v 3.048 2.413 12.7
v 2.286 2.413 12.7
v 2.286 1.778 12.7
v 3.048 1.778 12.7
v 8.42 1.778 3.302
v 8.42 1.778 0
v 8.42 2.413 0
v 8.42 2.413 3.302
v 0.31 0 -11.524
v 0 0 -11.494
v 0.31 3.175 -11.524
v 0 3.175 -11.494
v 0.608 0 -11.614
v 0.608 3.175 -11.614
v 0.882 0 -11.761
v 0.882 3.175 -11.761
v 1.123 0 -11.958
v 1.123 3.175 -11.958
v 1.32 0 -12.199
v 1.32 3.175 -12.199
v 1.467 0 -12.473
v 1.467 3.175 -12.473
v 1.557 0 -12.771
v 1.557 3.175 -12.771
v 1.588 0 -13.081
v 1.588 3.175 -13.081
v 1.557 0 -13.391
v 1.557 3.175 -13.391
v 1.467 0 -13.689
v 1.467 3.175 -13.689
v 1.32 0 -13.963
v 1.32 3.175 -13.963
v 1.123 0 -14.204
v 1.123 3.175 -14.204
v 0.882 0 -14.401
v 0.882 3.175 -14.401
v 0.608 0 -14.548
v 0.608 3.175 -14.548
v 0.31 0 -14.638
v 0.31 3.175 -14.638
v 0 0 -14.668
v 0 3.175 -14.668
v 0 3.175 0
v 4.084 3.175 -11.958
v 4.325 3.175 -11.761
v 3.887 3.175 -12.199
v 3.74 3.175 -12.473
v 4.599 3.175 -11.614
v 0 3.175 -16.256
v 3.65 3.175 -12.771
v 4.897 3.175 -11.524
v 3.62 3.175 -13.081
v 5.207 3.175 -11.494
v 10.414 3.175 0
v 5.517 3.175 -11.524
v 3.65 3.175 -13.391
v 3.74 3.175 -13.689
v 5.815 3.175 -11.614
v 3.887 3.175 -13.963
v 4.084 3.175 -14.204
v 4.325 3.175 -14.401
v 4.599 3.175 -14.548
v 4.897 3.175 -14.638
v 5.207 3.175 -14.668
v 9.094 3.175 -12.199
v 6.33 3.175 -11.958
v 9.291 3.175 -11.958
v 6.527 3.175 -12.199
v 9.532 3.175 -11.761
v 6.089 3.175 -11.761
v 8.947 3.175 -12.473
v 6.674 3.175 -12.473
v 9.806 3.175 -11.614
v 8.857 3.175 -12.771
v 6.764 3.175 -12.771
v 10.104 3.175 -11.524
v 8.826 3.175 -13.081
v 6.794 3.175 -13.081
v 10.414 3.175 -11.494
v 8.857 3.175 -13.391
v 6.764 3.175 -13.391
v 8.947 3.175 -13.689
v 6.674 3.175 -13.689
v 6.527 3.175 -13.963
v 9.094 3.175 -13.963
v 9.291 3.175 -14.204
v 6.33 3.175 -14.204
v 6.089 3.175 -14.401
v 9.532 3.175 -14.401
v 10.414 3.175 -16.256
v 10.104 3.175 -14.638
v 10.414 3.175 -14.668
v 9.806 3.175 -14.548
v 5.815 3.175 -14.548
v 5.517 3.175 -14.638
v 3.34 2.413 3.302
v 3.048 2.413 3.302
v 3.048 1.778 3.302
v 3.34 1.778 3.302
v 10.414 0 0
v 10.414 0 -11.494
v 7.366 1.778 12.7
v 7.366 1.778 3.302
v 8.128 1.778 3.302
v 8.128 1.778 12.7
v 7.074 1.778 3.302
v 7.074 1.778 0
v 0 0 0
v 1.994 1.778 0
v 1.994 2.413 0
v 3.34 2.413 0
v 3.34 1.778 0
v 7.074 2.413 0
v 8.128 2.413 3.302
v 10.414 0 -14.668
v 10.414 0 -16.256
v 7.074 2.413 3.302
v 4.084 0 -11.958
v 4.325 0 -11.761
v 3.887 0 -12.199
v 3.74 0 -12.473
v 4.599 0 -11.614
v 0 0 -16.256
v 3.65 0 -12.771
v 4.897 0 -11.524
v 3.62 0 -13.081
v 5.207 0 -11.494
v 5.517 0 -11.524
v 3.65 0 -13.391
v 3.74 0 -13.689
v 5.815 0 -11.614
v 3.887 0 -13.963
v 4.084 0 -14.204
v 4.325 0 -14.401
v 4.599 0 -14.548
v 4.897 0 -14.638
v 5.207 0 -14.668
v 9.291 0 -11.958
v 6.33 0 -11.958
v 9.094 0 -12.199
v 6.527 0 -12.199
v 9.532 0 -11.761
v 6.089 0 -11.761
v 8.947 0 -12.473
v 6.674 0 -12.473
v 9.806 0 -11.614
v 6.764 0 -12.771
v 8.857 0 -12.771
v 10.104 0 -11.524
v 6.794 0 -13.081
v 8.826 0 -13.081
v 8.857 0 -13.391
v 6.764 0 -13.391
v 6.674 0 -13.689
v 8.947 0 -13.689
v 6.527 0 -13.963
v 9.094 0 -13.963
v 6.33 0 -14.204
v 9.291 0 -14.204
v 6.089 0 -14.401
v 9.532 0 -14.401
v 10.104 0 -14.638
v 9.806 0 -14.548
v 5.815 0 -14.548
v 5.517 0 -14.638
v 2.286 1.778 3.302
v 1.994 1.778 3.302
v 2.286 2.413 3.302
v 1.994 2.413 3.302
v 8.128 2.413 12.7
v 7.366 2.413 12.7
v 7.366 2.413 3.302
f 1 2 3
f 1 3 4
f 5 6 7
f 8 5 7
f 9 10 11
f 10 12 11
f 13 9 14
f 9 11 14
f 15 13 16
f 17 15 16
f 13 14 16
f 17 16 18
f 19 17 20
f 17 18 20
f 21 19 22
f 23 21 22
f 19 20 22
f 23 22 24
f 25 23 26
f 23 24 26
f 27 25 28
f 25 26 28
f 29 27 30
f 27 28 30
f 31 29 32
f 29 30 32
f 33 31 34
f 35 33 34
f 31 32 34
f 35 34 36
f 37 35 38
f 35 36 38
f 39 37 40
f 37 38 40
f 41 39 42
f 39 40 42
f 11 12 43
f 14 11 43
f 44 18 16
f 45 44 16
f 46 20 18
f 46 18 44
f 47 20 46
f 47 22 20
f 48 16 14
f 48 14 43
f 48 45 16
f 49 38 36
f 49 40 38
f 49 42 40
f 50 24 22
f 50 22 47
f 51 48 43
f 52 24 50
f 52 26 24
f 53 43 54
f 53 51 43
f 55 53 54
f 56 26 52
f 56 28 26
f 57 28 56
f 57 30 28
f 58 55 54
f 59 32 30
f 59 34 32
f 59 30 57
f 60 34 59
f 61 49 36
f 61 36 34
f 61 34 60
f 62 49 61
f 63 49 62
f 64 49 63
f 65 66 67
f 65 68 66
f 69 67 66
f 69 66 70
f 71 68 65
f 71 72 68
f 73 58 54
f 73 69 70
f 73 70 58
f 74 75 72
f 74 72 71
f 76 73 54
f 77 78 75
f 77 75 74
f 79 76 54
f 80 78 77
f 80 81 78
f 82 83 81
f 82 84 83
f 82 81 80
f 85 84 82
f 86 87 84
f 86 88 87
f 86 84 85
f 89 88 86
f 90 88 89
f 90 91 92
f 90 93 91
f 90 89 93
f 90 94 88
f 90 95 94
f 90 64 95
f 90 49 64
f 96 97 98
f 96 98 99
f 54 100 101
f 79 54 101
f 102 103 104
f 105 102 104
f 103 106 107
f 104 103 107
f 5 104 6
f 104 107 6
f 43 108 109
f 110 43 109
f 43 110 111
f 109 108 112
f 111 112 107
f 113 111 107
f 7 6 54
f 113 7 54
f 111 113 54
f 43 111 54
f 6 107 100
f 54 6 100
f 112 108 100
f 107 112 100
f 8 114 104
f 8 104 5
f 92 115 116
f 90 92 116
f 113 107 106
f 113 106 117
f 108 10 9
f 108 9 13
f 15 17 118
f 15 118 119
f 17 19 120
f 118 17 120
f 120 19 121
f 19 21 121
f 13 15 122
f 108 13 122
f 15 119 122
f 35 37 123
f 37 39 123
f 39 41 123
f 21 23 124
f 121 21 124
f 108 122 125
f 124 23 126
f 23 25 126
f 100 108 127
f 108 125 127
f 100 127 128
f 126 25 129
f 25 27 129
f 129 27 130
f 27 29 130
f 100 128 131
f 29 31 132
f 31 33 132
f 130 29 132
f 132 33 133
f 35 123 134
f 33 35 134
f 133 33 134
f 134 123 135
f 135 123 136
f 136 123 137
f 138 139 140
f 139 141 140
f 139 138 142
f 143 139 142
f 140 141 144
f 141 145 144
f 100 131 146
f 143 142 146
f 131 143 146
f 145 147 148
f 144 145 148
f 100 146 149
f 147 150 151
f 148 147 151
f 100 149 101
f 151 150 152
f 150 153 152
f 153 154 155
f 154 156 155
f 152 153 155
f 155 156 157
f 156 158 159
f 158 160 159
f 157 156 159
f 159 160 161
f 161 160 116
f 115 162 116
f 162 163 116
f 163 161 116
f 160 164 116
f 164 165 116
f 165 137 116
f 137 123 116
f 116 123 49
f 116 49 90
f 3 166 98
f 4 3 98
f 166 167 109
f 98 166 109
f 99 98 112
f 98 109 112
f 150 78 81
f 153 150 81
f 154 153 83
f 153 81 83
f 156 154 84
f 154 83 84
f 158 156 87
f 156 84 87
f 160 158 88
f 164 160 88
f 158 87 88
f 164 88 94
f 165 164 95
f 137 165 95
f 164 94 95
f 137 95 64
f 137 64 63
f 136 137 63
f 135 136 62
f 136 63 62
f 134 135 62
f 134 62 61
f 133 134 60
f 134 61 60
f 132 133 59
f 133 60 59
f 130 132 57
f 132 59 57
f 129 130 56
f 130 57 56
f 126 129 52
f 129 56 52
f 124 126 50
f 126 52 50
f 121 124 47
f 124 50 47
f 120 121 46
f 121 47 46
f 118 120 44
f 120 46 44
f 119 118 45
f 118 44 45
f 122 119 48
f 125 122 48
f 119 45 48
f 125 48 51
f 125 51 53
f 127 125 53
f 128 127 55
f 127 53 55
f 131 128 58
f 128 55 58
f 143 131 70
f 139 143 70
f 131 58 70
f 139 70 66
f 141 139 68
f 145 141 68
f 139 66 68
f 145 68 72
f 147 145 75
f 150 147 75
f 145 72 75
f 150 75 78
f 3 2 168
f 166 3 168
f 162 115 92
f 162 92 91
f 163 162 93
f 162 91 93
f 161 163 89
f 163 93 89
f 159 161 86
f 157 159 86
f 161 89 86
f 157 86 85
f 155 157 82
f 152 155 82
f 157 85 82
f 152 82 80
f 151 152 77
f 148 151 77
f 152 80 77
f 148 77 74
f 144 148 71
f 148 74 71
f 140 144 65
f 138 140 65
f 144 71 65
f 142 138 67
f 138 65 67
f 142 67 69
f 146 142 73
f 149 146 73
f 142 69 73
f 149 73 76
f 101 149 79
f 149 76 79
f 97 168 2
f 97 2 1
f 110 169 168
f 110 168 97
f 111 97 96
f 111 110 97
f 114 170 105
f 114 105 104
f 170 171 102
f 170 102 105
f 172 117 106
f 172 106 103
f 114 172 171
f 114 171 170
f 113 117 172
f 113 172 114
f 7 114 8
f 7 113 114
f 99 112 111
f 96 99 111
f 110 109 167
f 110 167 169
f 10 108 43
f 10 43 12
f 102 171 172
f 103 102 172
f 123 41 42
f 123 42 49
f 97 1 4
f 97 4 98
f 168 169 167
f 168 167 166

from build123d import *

# Parameters (mm, degrees)
SKETCH1_W           = 10.414
SKETCH1_H           = 16.256
BOSS_EXTRUDE1_DEPTH = 3.175
SKETCH2_R           = 1.5875
CUT_EXTRUDE1_DEPTH  = 3.175
SKETCH3_W           = 1.3462
SKETCH3_H           = 0.635
BOSS_EXTRUDE2_DEPTH = 12.7
SKETCH4_W           = 0.2921
SKETCH4_H           = 9.398
CUT_EXTRUDE2_DEPTH  = 3.413


with BuildPart() as part:
    # Sketch1 → Boss-Extrude1 (new body)
    with BuildSketch(Plane(origin=(0, 0, 0), x_dir=(1, 0, 0), z_dir=(0, 1, 0))):
        with Locations((5.207, 8.128)):
            Rectangle(SKETCH1_W, SKETCH1_H)
    extrude(amount=BOSS_EXTRUDE1_DEPTH)

    # Sketch2 → Cut-Extrude1 (cut)
    with BuildSketch(Plane(origin=(0, 3.175, 0), x_dir=(1, 0, 0), z_dir=(0, 1, 0))):
        with Locations((5.207, 13.081)):
            Circle(SKETCH2_R)
        with Locations((10.414, 13.081)):
            Circle(SKETCH2_R)
        with Locations((0, 13.081)):
            Circle(SKETCH2_R)
    extrude(amount=-CUT_EXTRUDE1_DEPTH, mode=Mode.SUBTRACT)

    # Sketch3 → Boss-Extrude2 (add)
    with BuildSketch(Plane.XY):
        with Locations((7.747, 2.0955)):
            Rectangle(SKETCH3_W, SKETCH3_H)
        with Locations((2.667, 2.0955)):
            Rectangle(SKETCH3_W, SKETCH3_H)
    extrude(amount=BOSS_EXTRUDE2_DEPTH)

    # Sketch4 → Cut-Extrude2 (cut, through all)
    with BuildSketch(Plane(origin=(0, 2.413, 0), x_dir=(1, 0, 0), z_dir=(0, 1, 0))):
        with Locations((2.13995, -8.001)):
            Rectangle(SKETCH4_W, SKETCH4_H)
        with Locations((3.19405, -8.001)):
            Rectangle(SKETCH4_W, SKETCH4_H)
        with Locations((7.21995, -8.001)):
            Rectangle(SKETCH4_W, SKETCH4_H)
        with Locations((8.27405, -8.001)):
            Rectangle(SKETCH4_W, SKETCH4_H)
    extrude(amount=-CUT_EXTRUDE2_DEPTH, mode=Mode.SUBTRACT)


solid = part.part
